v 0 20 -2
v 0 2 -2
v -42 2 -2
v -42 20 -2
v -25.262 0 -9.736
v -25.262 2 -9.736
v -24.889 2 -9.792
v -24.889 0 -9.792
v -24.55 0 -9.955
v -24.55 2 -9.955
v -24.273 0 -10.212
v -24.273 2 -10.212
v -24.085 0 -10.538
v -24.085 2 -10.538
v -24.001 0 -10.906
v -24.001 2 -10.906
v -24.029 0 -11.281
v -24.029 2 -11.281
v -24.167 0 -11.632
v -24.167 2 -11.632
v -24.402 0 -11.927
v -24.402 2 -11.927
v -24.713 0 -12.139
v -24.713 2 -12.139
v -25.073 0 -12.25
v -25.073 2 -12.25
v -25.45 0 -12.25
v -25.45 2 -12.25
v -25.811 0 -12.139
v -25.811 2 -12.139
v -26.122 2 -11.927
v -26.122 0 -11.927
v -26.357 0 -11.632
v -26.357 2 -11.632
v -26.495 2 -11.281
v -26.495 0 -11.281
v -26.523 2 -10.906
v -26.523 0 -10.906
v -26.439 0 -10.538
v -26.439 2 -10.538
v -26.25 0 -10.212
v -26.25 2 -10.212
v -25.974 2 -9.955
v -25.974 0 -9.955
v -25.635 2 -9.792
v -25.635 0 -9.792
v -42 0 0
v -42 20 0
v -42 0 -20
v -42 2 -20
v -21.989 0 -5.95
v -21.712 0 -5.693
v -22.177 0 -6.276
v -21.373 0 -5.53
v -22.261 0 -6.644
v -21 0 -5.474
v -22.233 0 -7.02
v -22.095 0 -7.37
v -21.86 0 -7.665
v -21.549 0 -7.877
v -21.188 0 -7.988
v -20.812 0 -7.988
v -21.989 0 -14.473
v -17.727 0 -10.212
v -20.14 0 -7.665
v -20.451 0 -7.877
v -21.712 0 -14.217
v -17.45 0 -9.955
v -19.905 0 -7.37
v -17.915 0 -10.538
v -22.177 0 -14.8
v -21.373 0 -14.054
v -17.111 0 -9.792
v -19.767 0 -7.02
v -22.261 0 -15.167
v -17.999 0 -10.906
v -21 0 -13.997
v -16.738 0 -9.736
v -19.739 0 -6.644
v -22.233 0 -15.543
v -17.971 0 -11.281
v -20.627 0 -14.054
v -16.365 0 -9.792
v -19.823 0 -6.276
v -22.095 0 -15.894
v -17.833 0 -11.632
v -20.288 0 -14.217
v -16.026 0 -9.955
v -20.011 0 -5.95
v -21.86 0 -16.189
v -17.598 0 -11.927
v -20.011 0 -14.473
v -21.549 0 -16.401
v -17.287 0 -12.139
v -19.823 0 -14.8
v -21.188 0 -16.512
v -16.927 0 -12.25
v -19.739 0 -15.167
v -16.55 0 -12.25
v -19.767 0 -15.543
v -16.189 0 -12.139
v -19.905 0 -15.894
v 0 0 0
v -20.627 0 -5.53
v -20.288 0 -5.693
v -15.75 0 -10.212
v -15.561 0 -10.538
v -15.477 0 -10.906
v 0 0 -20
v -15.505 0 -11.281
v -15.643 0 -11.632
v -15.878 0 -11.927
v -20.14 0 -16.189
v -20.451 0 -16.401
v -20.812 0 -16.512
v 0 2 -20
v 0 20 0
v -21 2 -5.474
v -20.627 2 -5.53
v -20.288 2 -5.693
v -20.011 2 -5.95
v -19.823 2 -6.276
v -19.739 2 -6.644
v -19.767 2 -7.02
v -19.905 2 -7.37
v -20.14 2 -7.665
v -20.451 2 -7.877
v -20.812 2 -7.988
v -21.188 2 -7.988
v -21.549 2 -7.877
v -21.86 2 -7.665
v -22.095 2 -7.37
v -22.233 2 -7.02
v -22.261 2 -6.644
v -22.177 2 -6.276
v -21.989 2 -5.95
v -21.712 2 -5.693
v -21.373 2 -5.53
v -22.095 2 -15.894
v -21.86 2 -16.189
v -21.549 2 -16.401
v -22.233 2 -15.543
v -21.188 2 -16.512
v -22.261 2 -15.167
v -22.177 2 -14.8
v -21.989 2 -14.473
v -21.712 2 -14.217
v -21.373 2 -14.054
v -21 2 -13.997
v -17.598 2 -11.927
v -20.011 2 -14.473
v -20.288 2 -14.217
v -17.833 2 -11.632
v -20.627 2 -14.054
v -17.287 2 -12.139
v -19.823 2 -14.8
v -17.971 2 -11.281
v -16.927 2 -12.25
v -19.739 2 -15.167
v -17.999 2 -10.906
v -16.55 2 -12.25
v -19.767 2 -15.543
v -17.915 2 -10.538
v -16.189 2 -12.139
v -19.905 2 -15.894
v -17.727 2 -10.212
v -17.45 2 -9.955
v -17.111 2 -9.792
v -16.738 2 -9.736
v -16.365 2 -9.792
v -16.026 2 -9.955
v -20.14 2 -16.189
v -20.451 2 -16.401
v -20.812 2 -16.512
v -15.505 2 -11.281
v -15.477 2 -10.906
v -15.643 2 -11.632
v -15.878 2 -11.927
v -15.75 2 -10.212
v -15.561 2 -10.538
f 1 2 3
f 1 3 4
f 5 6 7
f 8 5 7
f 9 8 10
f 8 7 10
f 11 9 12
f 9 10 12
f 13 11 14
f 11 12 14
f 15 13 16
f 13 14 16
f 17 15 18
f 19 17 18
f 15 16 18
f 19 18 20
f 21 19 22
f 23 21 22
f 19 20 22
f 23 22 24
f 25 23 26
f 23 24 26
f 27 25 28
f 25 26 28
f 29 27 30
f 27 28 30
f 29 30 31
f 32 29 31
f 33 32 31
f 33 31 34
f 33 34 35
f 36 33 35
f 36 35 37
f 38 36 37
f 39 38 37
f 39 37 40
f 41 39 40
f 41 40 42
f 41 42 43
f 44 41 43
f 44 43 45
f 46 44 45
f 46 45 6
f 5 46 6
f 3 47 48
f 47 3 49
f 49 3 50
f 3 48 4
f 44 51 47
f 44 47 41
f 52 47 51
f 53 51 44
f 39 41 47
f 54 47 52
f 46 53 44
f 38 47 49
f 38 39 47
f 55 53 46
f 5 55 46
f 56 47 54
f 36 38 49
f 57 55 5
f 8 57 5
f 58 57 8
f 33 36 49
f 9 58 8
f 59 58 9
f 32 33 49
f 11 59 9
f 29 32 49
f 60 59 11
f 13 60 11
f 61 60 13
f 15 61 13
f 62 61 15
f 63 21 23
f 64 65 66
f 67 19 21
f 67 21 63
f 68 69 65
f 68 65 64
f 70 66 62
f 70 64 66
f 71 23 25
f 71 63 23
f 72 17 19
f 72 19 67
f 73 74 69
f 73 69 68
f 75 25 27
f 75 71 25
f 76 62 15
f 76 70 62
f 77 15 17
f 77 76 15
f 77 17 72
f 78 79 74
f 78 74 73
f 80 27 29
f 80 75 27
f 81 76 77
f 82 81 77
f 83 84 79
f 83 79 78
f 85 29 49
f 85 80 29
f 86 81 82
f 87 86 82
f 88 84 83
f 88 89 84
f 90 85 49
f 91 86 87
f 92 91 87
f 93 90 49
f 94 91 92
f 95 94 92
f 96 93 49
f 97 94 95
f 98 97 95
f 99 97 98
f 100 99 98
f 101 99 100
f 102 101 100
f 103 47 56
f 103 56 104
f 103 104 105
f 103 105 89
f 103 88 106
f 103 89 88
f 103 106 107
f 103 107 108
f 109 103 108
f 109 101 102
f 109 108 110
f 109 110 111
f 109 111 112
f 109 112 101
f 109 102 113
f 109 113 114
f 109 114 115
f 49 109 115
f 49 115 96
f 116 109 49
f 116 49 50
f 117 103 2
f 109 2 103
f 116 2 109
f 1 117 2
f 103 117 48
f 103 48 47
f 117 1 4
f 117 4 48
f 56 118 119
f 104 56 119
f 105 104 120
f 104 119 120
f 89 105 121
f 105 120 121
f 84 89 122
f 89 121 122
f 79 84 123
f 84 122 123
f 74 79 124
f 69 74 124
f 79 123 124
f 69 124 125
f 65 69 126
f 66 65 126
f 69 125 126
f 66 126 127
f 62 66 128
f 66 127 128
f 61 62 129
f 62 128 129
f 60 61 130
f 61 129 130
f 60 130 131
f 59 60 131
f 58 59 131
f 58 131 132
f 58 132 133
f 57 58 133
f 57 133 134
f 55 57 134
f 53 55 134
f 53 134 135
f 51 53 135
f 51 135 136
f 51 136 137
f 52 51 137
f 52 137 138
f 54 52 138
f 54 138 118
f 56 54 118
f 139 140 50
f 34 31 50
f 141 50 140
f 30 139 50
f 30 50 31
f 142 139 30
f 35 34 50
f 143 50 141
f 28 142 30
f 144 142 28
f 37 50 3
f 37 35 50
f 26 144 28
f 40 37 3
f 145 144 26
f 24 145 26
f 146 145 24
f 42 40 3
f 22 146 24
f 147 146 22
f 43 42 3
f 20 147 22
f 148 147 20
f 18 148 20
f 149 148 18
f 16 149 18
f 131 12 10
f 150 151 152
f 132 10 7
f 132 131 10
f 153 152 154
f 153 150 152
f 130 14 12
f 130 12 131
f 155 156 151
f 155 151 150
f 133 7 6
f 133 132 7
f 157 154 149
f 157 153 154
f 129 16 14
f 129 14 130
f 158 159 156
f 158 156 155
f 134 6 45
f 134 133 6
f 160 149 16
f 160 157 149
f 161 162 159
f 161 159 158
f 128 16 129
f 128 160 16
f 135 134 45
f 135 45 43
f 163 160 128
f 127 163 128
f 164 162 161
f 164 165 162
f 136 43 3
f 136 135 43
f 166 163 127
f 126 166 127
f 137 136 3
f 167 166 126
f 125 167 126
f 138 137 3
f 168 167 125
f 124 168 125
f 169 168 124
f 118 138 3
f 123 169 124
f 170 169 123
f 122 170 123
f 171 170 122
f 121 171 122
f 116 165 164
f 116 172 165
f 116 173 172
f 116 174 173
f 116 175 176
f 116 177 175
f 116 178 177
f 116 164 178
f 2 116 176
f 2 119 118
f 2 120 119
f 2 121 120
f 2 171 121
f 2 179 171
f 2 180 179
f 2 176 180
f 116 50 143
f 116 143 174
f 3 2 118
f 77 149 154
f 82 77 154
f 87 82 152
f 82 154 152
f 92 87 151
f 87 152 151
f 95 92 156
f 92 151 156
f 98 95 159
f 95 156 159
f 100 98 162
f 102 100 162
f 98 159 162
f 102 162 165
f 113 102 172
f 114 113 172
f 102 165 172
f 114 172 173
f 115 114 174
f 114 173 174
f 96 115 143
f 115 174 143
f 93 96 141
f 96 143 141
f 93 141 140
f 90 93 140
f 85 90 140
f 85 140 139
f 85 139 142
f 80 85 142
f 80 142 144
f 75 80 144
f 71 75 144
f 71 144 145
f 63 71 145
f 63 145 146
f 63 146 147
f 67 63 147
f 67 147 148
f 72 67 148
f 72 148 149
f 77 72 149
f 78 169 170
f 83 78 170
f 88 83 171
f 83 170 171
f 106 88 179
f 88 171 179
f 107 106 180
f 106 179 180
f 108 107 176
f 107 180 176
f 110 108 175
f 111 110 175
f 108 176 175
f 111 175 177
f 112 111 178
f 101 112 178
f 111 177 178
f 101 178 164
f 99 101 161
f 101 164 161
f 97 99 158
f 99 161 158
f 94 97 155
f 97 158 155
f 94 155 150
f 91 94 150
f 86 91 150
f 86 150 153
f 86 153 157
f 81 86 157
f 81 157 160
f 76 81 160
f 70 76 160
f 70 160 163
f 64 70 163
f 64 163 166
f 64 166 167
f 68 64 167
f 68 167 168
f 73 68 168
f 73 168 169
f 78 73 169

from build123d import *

# Parameters (mm, degrees)
BOSS_EXTRUDE1_DEPTH = 42
SKETCH2_R           = 1.264493958
CUT_EXTRUDE1_DEPTH  = 50.879855653


with BuildPart() as part:
    # Sketch1 → Boss-Extrude1 (new body)
    with BuildSketch(Plane(origin=(0, 0, 0), x_dir=(0, 0, -1), z_dir=(1, 0, 0))):
        Polygon((0, 20), (0, 0), (20, 0), (20, 2), (2, 2), (2, 20), align=None)
    extrude(amount=-BOSS_EXTRUDE1_DEPTH)

    # Sketch2 → Cut-Extrude1 (cut, through all)
    with BuildSketch(Plane(origin=(0, 2, 0), x_dir=(1, 0, 0), z_dir=(0, 1, 0))):
        with Locations(Location((-21, 15.261871586, 0), (0, 0, 270))):
            Circle(SKETCH2_R)
        with Locations(Location((-16.738128414, 11, 0), (0, 0, 270))):
            Circle(SKETCH2_R)
        with Locations(Location((-21, 6.738128414, 0), (0, 0, 270))):
            Circle(SKETCH2_R)
        with Locations(Location((-25.261871586, 11, 0), (0, 0, 270))):
            Circle(SKETCH2_R)
    extrude(amount=-CUT_EXTRUDE1_DEPTH, mode=Mode.SUBTRACT)


solid = part.part
